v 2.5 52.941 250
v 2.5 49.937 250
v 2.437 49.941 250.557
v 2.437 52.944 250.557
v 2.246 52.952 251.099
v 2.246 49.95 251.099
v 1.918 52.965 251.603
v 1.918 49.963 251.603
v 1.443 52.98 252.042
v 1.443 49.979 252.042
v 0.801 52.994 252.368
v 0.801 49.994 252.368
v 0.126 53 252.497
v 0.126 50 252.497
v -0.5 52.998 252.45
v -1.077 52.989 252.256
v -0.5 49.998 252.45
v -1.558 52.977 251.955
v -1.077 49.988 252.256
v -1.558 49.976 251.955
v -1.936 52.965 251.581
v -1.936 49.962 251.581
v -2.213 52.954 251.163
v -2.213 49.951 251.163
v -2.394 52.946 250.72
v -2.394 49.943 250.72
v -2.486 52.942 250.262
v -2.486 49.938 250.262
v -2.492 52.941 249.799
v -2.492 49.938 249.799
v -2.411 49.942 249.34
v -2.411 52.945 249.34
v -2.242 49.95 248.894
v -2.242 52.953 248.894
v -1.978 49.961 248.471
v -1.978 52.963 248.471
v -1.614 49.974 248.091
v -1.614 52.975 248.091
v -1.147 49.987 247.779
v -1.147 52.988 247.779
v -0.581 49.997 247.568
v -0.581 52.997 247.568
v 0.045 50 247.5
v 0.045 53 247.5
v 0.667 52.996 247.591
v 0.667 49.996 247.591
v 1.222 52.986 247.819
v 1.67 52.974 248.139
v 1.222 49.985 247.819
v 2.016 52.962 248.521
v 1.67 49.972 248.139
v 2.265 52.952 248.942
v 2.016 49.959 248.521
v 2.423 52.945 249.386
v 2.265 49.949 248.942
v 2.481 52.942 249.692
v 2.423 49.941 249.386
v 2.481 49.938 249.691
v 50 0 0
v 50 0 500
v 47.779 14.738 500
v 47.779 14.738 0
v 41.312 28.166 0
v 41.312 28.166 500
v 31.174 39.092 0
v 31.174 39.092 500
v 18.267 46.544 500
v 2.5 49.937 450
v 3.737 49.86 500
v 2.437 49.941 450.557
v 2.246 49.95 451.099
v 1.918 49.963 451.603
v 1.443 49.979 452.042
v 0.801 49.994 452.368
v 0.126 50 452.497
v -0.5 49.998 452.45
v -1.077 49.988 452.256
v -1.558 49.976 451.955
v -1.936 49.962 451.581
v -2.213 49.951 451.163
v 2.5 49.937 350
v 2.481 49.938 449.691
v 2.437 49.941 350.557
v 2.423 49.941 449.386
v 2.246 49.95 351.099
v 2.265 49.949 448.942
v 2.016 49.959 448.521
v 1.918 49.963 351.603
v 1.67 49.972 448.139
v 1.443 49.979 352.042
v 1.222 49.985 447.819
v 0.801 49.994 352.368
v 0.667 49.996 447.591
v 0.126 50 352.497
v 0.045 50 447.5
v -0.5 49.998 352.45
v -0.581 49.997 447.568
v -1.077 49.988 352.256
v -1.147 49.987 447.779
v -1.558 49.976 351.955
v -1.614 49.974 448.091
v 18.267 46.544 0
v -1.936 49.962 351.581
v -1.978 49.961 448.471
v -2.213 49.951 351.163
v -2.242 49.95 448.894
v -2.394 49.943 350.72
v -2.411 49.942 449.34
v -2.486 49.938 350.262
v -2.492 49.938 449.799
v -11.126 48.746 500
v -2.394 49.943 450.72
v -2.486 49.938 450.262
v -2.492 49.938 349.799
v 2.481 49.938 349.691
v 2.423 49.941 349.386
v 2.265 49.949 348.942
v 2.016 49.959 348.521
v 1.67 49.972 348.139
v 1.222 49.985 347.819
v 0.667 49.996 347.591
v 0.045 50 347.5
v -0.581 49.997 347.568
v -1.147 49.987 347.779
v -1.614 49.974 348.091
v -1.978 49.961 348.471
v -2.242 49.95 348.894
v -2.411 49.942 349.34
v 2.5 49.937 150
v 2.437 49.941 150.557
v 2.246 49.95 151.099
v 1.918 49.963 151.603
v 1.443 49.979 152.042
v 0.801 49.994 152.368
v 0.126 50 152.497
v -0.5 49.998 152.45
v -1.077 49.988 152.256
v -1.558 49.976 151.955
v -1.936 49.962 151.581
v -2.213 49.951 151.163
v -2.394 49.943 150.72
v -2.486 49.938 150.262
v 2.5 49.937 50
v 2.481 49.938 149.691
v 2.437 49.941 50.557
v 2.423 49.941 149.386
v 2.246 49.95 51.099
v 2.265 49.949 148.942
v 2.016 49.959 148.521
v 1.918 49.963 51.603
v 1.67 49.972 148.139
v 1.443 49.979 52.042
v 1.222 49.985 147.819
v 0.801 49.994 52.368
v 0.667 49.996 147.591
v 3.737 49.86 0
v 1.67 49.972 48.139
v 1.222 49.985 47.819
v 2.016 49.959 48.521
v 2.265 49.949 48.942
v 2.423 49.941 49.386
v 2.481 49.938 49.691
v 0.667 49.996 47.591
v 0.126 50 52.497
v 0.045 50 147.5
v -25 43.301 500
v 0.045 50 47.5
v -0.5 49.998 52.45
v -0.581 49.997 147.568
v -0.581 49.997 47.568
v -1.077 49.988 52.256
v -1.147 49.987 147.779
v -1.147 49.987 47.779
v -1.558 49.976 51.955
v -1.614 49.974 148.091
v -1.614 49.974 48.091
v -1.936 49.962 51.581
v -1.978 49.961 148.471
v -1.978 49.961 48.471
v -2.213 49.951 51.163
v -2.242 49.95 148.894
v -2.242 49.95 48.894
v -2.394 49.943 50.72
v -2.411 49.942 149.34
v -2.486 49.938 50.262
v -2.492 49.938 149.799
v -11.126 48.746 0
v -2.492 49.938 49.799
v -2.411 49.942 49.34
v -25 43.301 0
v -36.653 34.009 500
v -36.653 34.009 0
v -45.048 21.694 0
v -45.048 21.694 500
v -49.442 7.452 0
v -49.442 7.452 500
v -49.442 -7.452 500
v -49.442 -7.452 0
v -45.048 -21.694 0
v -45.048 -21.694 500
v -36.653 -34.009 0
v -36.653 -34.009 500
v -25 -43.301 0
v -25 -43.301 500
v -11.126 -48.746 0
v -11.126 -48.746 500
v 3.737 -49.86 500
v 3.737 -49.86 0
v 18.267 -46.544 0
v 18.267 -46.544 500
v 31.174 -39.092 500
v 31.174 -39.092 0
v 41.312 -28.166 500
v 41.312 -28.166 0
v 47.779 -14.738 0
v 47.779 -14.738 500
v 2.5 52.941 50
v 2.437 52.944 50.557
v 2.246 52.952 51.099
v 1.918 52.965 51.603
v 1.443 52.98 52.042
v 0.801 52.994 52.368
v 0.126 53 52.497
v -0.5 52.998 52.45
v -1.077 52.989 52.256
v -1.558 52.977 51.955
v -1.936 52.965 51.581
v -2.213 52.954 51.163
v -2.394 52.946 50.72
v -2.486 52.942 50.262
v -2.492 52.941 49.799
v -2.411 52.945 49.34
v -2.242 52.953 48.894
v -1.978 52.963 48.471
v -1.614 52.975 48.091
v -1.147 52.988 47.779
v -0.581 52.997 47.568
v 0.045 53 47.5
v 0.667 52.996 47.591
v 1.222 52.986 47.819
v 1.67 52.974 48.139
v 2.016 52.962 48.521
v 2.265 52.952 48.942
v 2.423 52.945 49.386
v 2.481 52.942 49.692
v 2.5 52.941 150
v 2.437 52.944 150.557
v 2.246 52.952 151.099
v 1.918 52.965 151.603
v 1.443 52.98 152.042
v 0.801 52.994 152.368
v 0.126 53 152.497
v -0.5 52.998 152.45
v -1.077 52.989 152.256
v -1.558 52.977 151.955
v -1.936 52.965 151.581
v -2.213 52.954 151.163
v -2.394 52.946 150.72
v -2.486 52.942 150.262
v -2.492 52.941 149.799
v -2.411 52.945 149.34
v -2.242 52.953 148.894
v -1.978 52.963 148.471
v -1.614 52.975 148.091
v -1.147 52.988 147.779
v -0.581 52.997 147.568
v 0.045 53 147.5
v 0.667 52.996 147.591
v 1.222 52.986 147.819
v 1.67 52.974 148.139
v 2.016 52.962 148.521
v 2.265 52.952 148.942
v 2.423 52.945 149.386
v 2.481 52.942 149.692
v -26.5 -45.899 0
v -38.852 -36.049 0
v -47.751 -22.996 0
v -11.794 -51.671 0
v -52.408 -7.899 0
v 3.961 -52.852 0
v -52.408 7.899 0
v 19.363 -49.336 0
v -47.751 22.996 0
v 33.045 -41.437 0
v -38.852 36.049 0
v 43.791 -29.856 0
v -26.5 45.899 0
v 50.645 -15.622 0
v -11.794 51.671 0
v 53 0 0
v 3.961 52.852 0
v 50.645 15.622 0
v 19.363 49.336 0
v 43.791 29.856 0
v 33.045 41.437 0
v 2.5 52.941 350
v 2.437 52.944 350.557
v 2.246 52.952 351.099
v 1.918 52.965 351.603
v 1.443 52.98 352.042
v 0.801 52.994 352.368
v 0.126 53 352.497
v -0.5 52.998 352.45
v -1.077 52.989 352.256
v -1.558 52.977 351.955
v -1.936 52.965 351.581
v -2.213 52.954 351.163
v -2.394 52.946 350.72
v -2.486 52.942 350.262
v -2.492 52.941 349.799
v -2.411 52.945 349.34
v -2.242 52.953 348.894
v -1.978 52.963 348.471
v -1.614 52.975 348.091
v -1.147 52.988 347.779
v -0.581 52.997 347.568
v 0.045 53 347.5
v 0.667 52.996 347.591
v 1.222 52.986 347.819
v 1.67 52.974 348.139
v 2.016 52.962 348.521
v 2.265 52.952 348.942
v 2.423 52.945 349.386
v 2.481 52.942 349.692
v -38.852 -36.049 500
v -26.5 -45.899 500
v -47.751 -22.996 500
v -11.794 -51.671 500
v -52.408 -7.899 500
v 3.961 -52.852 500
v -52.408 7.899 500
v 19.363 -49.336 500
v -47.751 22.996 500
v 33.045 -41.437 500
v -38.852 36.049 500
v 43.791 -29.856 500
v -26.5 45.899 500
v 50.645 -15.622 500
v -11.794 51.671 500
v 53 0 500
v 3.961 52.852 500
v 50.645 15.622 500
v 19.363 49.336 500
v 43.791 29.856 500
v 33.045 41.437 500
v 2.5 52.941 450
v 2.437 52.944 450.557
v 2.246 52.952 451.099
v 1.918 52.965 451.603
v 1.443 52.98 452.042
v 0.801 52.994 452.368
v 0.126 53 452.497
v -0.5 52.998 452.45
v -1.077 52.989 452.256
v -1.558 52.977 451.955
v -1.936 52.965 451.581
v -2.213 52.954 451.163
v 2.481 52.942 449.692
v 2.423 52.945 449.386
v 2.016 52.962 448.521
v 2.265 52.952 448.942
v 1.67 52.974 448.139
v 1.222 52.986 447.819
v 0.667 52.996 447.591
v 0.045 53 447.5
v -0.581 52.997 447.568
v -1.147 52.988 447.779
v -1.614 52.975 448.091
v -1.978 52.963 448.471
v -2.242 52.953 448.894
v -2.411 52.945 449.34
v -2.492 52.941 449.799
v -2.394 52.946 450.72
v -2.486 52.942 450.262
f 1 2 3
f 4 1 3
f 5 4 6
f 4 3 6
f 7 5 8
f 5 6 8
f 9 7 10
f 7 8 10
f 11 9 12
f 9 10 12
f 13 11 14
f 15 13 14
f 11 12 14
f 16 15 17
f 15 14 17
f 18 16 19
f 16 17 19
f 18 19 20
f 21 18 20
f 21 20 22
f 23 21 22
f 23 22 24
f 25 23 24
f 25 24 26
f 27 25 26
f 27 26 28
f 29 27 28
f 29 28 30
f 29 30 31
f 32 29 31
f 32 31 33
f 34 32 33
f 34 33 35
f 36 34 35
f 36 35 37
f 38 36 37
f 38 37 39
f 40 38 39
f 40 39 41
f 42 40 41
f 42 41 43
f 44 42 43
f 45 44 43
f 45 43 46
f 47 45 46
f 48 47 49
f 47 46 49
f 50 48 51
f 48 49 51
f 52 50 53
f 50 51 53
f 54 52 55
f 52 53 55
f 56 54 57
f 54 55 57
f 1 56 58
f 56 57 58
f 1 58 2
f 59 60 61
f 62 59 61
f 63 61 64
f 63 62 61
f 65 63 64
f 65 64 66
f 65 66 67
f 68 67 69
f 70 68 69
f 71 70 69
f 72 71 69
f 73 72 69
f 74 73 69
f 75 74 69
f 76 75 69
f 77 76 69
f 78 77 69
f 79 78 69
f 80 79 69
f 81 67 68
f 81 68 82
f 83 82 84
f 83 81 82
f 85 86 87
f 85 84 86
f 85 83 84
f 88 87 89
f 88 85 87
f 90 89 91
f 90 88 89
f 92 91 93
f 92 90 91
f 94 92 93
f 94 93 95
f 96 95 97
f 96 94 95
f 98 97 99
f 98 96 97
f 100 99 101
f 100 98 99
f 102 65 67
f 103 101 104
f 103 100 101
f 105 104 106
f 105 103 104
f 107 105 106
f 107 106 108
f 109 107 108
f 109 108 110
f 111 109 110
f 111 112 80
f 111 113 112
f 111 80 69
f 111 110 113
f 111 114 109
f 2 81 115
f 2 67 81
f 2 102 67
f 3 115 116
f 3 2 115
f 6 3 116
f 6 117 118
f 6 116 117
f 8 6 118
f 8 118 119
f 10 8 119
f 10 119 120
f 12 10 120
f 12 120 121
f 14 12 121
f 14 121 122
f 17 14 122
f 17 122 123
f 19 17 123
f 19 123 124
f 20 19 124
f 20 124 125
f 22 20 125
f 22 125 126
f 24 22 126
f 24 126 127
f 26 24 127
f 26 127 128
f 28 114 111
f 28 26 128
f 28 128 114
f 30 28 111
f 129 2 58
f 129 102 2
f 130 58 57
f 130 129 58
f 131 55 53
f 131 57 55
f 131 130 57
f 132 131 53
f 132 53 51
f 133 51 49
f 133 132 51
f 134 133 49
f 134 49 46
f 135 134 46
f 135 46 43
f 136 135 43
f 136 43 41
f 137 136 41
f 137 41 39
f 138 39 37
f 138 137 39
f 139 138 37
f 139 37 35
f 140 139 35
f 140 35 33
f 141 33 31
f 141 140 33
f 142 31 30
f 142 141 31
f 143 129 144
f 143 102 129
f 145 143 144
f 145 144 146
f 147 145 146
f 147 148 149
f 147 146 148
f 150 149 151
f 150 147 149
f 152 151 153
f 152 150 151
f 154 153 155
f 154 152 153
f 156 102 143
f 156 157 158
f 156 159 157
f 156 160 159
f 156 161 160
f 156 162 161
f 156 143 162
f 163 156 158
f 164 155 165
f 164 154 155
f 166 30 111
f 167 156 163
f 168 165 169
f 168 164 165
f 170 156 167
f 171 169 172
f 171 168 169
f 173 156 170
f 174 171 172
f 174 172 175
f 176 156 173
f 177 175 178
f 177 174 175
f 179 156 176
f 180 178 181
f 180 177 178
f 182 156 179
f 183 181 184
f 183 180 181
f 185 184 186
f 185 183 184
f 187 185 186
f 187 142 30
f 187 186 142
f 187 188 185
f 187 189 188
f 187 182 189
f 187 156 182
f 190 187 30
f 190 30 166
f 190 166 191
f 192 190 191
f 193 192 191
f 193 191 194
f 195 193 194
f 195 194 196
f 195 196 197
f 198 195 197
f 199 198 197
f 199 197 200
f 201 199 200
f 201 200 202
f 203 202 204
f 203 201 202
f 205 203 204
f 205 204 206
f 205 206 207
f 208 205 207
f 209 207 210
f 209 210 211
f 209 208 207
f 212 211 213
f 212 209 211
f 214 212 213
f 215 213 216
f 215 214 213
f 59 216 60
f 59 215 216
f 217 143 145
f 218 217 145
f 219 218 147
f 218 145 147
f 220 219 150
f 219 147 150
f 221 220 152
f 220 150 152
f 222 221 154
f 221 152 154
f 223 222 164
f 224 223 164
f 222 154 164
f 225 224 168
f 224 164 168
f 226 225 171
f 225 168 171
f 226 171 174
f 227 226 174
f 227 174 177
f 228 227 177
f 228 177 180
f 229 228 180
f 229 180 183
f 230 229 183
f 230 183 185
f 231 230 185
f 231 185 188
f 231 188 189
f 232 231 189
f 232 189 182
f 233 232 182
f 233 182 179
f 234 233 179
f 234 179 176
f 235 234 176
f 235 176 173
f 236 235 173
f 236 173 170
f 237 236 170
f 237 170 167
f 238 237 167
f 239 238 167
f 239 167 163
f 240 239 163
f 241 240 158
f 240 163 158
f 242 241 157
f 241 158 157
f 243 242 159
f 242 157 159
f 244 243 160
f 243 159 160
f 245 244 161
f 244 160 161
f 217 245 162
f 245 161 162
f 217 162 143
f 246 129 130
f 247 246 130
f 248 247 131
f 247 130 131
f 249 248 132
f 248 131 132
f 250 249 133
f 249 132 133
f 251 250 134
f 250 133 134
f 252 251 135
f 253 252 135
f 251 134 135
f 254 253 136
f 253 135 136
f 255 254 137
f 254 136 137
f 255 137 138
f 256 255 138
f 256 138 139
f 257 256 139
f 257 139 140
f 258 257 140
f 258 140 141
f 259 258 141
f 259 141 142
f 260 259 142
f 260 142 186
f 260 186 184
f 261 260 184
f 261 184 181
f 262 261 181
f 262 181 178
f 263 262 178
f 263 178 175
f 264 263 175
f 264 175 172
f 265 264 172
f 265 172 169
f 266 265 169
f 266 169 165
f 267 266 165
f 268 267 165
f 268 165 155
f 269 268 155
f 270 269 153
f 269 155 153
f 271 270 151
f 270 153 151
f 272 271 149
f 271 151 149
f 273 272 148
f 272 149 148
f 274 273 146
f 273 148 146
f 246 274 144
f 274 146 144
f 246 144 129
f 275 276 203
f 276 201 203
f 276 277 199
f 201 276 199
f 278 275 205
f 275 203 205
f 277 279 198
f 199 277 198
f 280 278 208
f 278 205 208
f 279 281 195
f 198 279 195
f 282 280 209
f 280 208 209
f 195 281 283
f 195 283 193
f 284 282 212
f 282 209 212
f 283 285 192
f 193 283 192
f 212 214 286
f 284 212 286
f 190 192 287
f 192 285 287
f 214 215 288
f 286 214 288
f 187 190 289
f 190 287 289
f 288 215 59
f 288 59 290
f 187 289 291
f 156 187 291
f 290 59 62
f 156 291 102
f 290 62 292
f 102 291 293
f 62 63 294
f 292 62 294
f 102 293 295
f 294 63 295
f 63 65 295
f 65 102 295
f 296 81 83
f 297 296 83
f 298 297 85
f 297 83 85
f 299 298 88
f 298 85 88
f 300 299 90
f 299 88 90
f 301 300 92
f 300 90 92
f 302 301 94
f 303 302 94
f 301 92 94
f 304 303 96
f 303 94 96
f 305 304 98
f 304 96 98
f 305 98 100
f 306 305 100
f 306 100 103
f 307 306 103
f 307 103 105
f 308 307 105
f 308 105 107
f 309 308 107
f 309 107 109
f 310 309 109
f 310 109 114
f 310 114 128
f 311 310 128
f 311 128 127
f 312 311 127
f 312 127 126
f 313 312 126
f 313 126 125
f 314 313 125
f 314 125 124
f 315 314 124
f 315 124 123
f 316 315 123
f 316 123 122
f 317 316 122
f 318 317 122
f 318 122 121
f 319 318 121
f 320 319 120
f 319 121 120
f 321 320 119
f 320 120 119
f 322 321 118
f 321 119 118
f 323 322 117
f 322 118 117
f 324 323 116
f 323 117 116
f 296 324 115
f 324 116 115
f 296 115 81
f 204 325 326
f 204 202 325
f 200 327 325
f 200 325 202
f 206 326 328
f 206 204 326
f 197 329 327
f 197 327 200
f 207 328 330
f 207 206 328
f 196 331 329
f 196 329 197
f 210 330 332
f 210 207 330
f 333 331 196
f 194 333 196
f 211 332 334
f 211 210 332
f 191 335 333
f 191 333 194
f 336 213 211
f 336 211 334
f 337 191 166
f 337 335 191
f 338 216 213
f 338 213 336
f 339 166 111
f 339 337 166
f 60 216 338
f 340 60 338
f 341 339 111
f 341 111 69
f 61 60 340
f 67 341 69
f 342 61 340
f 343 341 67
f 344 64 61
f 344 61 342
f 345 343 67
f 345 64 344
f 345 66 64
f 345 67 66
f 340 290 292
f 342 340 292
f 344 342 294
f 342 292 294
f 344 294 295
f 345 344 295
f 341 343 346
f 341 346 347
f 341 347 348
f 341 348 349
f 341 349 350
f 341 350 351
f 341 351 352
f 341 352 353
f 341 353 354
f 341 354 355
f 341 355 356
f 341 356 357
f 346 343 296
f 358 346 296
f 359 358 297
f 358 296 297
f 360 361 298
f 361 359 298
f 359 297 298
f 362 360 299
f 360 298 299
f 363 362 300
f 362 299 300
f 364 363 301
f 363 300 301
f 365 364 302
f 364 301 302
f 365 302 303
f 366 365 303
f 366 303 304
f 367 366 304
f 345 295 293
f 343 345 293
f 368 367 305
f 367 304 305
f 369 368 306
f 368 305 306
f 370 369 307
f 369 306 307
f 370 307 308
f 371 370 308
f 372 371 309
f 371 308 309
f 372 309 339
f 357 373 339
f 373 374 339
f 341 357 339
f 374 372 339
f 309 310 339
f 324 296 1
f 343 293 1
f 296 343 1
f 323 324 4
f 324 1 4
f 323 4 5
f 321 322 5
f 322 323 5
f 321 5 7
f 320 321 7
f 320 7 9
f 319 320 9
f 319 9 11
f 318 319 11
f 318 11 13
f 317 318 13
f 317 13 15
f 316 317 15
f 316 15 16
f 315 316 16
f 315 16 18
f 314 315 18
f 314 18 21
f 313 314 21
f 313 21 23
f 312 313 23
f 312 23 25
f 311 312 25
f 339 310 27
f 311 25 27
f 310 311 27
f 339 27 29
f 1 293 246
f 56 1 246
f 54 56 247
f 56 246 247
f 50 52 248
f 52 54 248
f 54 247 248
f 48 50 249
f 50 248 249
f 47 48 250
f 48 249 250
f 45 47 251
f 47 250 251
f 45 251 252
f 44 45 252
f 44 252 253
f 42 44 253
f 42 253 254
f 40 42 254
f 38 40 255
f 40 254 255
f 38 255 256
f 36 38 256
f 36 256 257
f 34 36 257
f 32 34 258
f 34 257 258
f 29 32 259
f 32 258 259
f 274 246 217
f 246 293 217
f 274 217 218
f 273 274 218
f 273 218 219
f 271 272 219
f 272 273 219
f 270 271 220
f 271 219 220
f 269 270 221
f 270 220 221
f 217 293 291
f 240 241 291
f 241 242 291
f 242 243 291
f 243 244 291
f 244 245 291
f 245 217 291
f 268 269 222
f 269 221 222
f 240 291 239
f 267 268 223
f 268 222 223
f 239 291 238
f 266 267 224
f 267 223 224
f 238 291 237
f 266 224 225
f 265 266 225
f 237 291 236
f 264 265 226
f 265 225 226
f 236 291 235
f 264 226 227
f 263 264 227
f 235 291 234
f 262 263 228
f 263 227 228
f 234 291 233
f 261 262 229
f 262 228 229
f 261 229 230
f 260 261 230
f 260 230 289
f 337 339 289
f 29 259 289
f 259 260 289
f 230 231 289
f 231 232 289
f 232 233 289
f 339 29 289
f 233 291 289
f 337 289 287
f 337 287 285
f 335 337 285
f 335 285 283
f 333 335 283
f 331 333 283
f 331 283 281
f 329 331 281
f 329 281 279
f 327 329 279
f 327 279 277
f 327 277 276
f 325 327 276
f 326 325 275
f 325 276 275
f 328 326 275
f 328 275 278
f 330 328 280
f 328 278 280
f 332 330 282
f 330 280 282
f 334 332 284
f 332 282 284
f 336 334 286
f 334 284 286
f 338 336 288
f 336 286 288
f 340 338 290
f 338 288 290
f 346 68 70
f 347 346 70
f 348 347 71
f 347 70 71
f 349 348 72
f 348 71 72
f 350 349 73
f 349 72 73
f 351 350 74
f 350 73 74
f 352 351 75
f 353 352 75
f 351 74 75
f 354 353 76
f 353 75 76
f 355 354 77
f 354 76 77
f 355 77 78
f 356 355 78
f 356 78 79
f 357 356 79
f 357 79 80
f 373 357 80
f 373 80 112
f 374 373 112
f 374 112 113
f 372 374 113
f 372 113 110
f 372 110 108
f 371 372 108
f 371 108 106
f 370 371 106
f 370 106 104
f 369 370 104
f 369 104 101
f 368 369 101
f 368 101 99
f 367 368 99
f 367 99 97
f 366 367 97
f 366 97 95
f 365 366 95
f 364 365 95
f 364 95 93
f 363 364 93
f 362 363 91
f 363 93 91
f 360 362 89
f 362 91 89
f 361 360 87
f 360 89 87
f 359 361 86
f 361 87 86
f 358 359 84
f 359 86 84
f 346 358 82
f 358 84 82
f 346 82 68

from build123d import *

# Parameters (mm, degrees)
F0_R     = 53
F0_R_2   = 50
F1_DEPTH = 500
F3_D     = 5
F3_DEPTH = 53.001


with BuildPart() as f1:
    # F0 (on Top) → F1 (new body)
    with BuildSketch(Plane.XY):
        Circle(F0_R)
        Circle(F0_R_2, mode=Mode.SUBTRACT)
    extrude(amount=F1_DEPTH)

    # F3 (through all, one way)
    with BuildSketch(Plane.XZ):
        with Locations((0, 450), (0, 350), (0, 250), (0, 150), (0, 50)):
            Circle(F3_D / 2)
    extrude(amount=-F3_DEPTH, mode=Mode.SUBTRACT)


solid = f1.part
